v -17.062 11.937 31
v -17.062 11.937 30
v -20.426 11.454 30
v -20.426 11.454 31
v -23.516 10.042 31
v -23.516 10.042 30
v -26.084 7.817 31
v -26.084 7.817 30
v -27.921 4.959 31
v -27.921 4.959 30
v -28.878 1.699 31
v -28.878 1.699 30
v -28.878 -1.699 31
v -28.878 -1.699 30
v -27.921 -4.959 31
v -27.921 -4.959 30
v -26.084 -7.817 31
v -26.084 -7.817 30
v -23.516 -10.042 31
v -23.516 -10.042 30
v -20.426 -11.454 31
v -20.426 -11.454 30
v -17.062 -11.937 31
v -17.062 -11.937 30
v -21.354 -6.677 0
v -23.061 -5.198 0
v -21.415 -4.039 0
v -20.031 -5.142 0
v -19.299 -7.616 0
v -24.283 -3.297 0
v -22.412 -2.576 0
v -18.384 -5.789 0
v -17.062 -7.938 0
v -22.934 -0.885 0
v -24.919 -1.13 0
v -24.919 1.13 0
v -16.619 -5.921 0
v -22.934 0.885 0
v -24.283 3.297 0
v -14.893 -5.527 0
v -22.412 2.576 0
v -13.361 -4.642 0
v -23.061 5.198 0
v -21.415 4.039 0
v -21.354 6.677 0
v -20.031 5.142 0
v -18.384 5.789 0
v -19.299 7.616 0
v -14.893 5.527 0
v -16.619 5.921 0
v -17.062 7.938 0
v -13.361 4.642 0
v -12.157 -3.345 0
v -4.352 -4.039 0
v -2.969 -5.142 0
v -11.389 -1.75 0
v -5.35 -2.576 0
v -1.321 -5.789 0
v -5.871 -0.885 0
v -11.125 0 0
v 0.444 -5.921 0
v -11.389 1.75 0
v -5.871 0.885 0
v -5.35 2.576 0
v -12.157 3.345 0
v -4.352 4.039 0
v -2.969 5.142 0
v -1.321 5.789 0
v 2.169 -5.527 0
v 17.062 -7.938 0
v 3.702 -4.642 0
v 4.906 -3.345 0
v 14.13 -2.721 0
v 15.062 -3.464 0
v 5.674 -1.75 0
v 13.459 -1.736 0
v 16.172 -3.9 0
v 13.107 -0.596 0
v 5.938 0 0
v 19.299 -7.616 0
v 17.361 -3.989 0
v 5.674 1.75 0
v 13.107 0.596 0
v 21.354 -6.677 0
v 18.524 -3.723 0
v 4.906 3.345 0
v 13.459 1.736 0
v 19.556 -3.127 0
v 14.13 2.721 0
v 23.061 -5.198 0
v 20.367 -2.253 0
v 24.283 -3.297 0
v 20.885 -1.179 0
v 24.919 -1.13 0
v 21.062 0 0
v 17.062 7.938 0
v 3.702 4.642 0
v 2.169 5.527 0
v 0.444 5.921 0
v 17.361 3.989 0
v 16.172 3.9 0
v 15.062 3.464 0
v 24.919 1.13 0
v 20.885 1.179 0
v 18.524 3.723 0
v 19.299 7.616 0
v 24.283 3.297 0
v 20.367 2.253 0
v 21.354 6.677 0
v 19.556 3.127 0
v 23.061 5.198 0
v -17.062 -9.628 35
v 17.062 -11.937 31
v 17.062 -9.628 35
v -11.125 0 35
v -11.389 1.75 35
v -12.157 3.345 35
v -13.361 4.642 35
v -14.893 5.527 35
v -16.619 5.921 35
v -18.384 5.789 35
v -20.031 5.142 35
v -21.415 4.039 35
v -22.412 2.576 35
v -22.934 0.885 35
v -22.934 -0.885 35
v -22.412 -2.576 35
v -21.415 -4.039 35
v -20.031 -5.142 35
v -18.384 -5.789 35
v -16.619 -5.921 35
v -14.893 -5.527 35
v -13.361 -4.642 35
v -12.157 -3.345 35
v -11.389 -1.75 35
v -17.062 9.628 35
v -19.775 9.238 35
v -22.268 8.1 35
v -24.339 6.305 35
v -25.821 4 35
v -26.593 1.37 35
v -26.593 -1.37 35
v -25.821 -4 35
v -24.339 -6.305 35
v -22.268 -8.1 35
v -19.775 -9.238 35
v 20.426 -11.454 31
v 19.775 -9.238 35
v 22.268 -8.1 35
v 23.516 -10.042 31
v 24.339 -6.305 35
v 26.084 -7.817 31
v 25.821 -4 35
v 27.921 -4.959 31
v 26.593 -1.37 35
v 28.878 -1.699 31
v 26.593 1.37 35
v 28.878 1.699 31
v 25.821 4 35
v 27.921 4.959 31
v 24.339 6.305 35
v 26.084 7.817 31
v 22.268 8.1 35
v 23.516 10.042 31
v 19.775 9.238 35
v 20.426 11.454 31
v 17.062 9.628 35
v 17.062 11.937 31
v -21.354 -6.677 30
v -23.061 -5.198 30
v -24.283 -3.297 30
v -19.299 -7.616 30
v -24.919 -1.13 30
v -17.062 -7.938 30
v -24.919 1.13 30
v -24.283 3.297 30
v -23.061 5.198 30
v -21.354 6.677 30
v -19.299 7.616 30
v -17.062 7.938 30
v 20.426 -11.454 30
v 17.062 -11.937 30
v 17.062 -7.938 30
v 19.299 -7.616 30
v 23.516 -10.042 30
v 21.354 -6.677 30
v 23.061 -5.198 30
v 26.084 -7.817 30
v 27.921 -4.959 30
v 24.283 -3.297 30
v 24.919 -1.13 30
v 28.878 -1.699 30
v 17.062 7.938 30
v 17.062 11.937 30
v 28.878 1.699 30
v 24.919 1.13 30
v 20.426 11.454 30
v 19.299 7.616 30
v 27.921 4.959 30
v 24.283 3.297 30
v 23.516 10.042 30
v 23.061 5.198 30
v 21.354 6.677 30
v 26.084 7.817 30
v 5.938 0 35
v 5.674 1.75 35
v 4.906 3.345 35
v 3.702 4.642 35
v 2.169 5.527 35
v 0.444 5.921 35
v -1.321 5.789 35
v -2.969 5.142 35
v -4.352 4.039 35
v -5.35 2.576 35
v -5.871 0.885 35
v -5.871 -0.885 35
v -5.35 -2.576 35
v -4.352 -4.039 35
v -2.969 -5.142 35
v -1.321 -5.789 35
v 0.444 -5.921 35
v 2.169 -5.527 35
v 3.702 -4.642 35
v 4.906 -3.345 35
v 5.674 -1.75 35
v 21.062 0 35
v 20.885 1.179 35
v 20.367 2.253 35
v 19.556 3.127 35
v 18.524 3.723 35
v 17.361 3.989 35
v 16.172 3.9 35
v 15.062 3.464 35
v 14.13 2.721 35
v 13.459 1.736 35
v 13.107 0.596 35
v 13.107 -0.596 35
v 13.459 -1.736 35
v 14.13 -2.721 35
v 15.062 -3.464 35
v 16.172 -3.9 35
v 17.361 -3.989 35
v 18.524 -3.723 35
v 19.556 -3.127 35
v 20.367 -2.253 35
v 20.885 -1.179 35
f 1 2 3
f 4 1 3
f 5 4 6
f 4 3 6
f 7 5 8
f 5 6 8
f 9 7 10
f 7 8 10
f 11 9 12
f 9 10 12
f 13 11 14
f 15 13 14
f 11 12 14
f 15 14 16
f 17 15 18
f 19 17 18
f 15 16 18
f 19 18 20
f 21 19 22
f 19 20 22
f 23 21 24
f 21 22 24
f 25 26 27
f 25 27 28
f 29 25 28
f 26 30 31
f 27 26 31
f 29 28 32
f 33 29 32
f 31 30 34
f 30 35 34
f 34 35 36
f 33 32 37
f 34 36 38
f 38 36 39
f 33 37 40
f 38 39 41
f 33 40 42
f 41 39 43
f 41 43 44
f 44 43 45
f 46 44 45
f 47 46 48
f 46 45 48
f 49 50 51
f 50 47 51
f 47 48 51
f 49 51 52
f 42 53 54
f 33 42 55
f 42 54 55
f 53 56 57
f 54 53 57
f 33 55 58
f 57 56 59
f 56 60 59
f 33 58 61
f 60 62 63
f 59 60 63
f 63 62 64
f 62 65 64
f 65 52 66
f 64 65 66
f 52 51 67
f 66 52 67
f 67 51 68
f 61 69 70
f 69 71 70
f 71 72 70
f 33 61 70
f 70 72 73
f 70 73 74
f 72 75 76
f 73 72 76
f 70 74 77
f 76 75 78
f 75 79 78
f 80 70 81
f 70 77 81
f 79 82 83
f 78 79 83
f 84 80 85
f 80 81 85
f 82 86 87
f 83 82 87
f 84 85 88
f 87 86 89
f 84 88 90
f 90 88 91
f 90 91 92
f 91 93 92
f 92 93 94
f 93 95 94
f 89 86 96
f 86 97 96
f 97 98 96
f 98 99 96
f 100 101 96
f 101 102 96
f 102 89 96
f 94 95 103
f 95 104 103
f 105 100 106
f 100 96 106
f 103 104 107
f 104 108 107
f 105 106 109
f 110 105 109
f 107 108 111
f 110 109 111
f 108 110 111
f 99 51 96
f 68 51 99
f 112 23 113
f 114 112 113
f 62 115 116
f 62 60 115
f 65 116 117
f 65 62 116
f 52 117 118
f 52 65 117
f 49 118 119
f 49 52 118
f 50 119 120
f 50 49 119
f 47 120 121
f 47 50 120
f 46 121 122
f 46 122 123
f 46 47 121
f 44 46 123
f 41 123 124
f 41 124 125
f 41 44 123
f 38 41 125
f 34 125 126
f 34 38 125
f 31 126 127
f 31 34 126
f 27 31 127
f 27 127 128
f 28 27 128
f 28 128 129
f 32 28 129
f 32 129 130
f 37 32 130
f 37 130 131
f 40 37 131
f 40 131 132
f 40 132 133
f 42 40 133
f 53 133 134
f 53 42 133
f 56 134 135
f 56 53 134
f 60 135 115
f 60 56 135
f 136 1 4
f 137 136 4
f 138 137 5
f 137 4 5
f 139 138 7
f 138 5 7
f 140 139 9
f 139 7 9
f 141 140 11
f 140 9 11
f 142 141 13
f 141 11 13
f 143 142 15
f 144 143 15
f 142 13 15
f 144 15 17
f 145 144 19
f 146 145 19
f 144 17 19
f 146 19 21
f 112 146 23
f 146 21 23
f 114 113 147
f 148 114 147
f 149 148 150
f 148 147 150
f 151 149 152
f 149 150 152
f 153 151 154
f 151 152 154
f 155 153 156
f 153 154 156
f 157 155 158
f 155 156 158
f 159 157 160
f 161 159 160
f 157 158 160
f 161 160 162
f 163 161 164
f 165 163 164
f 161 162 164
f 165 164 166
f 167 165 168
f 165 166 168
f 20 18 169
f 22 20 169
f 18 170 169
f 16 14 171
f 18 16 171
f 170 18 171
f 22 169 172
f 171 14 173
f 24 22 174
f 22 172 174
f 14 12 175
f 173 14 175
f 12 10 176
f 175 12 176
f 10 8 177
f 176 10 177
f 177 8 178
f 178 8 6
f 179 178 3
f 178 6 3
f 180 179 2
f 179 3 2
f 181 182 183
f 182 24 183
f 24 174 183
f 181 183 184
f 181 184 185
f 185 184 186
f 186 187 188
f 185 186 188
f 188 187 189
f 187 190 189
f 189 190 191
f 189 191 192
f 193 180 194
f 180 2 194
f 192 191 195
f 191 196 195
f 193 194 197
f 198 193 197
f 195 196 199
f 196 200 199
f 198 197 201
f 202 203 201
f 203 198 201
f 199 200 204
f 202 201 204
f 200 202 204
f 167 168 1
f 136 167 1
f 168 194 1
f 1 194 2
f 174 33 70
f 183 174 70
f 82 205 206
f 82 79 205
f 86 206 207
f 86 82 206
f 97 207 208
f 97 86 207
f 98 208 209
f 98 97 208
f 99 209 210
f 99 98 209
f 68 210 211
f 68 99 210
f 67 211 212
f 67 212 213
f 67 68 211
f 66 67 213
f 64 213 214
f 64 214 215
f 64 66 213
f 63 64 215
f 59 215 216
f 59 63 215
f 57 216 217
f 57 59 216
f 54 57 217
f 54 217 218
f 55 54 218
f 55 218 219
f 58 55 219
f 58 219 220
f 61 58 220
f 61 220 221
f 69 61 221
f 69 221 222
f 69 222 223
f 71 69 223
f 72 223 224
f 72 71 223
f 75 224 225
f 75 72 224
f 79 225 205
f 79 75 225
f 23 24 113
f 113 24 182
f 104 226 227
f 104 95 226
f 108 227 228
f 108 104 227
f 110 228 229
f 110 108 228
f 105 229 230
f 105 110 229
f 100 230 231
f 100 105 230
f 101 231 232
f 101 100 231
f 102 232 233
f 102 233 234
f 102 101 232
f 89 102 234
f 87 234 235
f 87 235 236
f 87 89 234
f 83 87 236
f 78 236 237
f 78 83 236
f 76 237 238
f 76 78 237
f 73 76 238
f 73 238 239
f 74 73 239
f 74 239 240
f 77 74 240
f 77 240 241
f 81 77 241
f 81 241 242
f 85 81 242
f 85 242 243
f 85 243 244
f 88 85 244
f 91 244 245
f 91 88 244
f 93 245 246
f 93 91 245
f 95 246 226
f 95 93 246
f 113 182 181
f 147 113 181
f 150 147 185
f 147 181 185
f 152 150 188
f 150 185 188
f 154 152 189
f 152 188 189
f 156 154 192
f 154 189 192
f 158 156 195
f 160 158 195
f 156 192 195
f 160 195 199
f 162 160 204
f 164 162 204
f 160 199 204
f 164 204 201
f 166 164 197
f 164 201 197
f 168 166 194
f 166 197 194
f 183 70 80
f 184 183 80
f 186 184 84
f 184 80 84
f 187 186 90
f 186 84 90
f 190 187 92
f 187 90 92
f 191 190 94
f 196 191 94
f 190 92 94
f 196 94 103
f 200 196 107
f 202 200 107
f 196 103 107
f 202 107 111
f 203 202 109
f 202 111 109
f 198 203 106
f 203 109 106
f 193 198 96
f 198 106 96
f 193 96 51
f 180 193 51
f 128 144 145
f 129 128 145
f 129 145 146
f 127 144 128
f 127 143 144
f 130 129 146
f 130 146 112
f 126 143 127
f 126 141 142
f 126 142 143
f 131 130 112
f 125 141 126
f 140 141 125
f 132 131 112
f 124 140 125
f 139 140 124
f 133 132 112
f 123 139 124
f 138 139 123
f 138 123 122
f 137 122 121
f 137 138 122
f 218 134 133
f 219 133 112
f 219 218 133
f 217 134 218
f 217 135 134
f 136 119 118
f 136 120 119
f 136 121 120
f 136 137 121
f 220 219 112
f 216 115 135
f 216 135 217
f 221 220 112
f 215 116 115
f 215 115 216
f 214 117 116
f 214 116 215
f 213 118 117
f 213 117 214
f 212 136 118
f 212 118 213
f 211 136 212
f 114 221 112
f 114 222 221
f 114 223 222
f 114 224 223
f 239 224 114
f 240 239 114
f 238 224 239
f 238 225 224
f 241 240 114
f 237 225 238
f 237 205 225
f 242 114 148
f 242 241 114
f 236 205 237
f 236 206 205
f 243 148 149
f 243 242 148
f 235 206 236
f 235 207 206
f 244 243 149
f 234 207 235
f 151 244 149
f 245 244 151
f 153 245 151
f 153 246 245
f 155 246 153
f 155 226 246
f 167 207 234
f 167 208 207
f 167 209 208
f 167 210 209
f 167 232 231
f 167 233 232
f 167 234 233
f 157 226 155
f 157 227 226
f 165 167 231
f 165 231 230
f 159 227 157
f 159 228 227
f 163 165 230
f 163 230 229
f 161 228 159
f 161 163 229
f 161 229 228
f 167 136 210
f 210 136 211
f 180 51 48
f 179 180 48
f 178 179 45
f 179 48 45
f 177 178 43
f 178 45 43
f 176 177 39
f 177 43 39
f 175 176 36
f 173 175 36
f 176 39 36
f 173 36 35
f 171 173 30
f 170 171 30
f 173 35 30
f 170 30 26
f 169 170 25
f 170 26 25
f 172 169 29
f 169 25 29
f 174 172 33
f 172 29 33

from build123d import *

# Parameters (mm, degrees)
F0_R     = 5.9375
F0_R_2   = 5.9375000447
F0_R_3   = 4
F1_DEPTH = 30
F2_R     = 5.9375
F2_R_2   = 5.9375000447
F2_R_3   = 4
F3_DEPTH = 5
F4_SIZE2 = 4
F4_SIZE  = 2.3094010768


with BuildPart() as f1:
    # F0 (on Top) → F1 (new body)
    with BuildSketch(Plane.XY):
        with BuildLine():
            Line((-17.0625, -7.9375), (0, -7.9375))
            Line((0, -7.9375), (17.0625, -7.9375))
            ThreePointArc((17.0625, -7.9375), (25, 0), (17.0625, 7.9375))
            Line((17.0625, 7.9375), (0, 7.9375))
            Line((0, 7.9375), (-17.0625, 7.9375))
            ThreePointArc((-17.0625, 7.9375), (-25, 0), (-17.0625, -7.9375))
        make_face()
        with Locations((-17.0625, 0)):
            Circle(F0_R, mode=Mode.SUBTRACT)
        Circle(F0_R_2, mode=Mode.SUBTRACT)
        with Locations((17.0625, 0)):
            Circle(F0_R_3, mode=Mode.SUBTRACT)
    extrude(amount=F1_DEPTH)

    # F2 (on face) → F3 (join)
    with BuildSketch(Plane.XY.offset(30)):
        with BuildLine():
            ThreePointArc((17.0625, -11.9374991655), (28.9999991655, 0), (17.0625, 11.9374991655))
            Line((17.0625, 11.9374991655), (-17.0625, 11.9374991655))
            ThreePointArc((-17.0625, 11.9374991655), (-28.9999991655, 0), (-17.0625, -11.9374991655))
            Line((-17.0625, -11.9374991655), (17.0625, -11.9374991655))
        make_face()
        with BuildLine():
            ThreePointArc((-17.0625, -7.9375), (-25, 0), (-17.0625, 7.9375))
            Line((-17.0625, 7.9375), (17.0625, 7.9375))
            ThreePointArc((17.0625, 7.9375), (25, 0), (17.0625, -7.9375))
            Line((17.0625, -7.9375), (-17.0625, -7.9375))
        make_face(mode=Mode.SUBTRACT)
        with BuildLine():
            Line((17.0625, 7.9375), (-17.0625, 7.9375))
            ThreePointArc((-17.0625, 7.9375), (-25, 0), (-17.0625, -7.9375))
            Line((-17.0625, -7.9375), (17.0625, -7.9375))
            ThreePointArc((17.0625, -7.9375), (25, 0), (17.0625, 7.9375))
        make_face()
        with Locations((-17.0625, 0)):
            Circle(F2_R, mode=Mode.SUBTRACT)
        Circle(F2_R_2, mode=Mode.SUBTRACT)
        with Locations((17.0625, 0)):
            Circle(F2_R_3, mode=Mode.SUBTRACT)
    extrude(amount=F3_DEPTH)

    # F4
    f4_edges = [f1.edges().sort_by_distance(p)[0] for p in [
        (0, -11.937499, 35),
        (-28.999999, 0, 35),
        (0, 11.937499, 35),
        (28.999999, 0, 35),
    ]]
    f4_side = f1.faces().sort_by_distance((0, 11.310282, 35))[0]
    chamfer(f4_edges, length=F4_SIZE, length2=F4_SIZE2, reference=f4_side)


solid = f1.part
